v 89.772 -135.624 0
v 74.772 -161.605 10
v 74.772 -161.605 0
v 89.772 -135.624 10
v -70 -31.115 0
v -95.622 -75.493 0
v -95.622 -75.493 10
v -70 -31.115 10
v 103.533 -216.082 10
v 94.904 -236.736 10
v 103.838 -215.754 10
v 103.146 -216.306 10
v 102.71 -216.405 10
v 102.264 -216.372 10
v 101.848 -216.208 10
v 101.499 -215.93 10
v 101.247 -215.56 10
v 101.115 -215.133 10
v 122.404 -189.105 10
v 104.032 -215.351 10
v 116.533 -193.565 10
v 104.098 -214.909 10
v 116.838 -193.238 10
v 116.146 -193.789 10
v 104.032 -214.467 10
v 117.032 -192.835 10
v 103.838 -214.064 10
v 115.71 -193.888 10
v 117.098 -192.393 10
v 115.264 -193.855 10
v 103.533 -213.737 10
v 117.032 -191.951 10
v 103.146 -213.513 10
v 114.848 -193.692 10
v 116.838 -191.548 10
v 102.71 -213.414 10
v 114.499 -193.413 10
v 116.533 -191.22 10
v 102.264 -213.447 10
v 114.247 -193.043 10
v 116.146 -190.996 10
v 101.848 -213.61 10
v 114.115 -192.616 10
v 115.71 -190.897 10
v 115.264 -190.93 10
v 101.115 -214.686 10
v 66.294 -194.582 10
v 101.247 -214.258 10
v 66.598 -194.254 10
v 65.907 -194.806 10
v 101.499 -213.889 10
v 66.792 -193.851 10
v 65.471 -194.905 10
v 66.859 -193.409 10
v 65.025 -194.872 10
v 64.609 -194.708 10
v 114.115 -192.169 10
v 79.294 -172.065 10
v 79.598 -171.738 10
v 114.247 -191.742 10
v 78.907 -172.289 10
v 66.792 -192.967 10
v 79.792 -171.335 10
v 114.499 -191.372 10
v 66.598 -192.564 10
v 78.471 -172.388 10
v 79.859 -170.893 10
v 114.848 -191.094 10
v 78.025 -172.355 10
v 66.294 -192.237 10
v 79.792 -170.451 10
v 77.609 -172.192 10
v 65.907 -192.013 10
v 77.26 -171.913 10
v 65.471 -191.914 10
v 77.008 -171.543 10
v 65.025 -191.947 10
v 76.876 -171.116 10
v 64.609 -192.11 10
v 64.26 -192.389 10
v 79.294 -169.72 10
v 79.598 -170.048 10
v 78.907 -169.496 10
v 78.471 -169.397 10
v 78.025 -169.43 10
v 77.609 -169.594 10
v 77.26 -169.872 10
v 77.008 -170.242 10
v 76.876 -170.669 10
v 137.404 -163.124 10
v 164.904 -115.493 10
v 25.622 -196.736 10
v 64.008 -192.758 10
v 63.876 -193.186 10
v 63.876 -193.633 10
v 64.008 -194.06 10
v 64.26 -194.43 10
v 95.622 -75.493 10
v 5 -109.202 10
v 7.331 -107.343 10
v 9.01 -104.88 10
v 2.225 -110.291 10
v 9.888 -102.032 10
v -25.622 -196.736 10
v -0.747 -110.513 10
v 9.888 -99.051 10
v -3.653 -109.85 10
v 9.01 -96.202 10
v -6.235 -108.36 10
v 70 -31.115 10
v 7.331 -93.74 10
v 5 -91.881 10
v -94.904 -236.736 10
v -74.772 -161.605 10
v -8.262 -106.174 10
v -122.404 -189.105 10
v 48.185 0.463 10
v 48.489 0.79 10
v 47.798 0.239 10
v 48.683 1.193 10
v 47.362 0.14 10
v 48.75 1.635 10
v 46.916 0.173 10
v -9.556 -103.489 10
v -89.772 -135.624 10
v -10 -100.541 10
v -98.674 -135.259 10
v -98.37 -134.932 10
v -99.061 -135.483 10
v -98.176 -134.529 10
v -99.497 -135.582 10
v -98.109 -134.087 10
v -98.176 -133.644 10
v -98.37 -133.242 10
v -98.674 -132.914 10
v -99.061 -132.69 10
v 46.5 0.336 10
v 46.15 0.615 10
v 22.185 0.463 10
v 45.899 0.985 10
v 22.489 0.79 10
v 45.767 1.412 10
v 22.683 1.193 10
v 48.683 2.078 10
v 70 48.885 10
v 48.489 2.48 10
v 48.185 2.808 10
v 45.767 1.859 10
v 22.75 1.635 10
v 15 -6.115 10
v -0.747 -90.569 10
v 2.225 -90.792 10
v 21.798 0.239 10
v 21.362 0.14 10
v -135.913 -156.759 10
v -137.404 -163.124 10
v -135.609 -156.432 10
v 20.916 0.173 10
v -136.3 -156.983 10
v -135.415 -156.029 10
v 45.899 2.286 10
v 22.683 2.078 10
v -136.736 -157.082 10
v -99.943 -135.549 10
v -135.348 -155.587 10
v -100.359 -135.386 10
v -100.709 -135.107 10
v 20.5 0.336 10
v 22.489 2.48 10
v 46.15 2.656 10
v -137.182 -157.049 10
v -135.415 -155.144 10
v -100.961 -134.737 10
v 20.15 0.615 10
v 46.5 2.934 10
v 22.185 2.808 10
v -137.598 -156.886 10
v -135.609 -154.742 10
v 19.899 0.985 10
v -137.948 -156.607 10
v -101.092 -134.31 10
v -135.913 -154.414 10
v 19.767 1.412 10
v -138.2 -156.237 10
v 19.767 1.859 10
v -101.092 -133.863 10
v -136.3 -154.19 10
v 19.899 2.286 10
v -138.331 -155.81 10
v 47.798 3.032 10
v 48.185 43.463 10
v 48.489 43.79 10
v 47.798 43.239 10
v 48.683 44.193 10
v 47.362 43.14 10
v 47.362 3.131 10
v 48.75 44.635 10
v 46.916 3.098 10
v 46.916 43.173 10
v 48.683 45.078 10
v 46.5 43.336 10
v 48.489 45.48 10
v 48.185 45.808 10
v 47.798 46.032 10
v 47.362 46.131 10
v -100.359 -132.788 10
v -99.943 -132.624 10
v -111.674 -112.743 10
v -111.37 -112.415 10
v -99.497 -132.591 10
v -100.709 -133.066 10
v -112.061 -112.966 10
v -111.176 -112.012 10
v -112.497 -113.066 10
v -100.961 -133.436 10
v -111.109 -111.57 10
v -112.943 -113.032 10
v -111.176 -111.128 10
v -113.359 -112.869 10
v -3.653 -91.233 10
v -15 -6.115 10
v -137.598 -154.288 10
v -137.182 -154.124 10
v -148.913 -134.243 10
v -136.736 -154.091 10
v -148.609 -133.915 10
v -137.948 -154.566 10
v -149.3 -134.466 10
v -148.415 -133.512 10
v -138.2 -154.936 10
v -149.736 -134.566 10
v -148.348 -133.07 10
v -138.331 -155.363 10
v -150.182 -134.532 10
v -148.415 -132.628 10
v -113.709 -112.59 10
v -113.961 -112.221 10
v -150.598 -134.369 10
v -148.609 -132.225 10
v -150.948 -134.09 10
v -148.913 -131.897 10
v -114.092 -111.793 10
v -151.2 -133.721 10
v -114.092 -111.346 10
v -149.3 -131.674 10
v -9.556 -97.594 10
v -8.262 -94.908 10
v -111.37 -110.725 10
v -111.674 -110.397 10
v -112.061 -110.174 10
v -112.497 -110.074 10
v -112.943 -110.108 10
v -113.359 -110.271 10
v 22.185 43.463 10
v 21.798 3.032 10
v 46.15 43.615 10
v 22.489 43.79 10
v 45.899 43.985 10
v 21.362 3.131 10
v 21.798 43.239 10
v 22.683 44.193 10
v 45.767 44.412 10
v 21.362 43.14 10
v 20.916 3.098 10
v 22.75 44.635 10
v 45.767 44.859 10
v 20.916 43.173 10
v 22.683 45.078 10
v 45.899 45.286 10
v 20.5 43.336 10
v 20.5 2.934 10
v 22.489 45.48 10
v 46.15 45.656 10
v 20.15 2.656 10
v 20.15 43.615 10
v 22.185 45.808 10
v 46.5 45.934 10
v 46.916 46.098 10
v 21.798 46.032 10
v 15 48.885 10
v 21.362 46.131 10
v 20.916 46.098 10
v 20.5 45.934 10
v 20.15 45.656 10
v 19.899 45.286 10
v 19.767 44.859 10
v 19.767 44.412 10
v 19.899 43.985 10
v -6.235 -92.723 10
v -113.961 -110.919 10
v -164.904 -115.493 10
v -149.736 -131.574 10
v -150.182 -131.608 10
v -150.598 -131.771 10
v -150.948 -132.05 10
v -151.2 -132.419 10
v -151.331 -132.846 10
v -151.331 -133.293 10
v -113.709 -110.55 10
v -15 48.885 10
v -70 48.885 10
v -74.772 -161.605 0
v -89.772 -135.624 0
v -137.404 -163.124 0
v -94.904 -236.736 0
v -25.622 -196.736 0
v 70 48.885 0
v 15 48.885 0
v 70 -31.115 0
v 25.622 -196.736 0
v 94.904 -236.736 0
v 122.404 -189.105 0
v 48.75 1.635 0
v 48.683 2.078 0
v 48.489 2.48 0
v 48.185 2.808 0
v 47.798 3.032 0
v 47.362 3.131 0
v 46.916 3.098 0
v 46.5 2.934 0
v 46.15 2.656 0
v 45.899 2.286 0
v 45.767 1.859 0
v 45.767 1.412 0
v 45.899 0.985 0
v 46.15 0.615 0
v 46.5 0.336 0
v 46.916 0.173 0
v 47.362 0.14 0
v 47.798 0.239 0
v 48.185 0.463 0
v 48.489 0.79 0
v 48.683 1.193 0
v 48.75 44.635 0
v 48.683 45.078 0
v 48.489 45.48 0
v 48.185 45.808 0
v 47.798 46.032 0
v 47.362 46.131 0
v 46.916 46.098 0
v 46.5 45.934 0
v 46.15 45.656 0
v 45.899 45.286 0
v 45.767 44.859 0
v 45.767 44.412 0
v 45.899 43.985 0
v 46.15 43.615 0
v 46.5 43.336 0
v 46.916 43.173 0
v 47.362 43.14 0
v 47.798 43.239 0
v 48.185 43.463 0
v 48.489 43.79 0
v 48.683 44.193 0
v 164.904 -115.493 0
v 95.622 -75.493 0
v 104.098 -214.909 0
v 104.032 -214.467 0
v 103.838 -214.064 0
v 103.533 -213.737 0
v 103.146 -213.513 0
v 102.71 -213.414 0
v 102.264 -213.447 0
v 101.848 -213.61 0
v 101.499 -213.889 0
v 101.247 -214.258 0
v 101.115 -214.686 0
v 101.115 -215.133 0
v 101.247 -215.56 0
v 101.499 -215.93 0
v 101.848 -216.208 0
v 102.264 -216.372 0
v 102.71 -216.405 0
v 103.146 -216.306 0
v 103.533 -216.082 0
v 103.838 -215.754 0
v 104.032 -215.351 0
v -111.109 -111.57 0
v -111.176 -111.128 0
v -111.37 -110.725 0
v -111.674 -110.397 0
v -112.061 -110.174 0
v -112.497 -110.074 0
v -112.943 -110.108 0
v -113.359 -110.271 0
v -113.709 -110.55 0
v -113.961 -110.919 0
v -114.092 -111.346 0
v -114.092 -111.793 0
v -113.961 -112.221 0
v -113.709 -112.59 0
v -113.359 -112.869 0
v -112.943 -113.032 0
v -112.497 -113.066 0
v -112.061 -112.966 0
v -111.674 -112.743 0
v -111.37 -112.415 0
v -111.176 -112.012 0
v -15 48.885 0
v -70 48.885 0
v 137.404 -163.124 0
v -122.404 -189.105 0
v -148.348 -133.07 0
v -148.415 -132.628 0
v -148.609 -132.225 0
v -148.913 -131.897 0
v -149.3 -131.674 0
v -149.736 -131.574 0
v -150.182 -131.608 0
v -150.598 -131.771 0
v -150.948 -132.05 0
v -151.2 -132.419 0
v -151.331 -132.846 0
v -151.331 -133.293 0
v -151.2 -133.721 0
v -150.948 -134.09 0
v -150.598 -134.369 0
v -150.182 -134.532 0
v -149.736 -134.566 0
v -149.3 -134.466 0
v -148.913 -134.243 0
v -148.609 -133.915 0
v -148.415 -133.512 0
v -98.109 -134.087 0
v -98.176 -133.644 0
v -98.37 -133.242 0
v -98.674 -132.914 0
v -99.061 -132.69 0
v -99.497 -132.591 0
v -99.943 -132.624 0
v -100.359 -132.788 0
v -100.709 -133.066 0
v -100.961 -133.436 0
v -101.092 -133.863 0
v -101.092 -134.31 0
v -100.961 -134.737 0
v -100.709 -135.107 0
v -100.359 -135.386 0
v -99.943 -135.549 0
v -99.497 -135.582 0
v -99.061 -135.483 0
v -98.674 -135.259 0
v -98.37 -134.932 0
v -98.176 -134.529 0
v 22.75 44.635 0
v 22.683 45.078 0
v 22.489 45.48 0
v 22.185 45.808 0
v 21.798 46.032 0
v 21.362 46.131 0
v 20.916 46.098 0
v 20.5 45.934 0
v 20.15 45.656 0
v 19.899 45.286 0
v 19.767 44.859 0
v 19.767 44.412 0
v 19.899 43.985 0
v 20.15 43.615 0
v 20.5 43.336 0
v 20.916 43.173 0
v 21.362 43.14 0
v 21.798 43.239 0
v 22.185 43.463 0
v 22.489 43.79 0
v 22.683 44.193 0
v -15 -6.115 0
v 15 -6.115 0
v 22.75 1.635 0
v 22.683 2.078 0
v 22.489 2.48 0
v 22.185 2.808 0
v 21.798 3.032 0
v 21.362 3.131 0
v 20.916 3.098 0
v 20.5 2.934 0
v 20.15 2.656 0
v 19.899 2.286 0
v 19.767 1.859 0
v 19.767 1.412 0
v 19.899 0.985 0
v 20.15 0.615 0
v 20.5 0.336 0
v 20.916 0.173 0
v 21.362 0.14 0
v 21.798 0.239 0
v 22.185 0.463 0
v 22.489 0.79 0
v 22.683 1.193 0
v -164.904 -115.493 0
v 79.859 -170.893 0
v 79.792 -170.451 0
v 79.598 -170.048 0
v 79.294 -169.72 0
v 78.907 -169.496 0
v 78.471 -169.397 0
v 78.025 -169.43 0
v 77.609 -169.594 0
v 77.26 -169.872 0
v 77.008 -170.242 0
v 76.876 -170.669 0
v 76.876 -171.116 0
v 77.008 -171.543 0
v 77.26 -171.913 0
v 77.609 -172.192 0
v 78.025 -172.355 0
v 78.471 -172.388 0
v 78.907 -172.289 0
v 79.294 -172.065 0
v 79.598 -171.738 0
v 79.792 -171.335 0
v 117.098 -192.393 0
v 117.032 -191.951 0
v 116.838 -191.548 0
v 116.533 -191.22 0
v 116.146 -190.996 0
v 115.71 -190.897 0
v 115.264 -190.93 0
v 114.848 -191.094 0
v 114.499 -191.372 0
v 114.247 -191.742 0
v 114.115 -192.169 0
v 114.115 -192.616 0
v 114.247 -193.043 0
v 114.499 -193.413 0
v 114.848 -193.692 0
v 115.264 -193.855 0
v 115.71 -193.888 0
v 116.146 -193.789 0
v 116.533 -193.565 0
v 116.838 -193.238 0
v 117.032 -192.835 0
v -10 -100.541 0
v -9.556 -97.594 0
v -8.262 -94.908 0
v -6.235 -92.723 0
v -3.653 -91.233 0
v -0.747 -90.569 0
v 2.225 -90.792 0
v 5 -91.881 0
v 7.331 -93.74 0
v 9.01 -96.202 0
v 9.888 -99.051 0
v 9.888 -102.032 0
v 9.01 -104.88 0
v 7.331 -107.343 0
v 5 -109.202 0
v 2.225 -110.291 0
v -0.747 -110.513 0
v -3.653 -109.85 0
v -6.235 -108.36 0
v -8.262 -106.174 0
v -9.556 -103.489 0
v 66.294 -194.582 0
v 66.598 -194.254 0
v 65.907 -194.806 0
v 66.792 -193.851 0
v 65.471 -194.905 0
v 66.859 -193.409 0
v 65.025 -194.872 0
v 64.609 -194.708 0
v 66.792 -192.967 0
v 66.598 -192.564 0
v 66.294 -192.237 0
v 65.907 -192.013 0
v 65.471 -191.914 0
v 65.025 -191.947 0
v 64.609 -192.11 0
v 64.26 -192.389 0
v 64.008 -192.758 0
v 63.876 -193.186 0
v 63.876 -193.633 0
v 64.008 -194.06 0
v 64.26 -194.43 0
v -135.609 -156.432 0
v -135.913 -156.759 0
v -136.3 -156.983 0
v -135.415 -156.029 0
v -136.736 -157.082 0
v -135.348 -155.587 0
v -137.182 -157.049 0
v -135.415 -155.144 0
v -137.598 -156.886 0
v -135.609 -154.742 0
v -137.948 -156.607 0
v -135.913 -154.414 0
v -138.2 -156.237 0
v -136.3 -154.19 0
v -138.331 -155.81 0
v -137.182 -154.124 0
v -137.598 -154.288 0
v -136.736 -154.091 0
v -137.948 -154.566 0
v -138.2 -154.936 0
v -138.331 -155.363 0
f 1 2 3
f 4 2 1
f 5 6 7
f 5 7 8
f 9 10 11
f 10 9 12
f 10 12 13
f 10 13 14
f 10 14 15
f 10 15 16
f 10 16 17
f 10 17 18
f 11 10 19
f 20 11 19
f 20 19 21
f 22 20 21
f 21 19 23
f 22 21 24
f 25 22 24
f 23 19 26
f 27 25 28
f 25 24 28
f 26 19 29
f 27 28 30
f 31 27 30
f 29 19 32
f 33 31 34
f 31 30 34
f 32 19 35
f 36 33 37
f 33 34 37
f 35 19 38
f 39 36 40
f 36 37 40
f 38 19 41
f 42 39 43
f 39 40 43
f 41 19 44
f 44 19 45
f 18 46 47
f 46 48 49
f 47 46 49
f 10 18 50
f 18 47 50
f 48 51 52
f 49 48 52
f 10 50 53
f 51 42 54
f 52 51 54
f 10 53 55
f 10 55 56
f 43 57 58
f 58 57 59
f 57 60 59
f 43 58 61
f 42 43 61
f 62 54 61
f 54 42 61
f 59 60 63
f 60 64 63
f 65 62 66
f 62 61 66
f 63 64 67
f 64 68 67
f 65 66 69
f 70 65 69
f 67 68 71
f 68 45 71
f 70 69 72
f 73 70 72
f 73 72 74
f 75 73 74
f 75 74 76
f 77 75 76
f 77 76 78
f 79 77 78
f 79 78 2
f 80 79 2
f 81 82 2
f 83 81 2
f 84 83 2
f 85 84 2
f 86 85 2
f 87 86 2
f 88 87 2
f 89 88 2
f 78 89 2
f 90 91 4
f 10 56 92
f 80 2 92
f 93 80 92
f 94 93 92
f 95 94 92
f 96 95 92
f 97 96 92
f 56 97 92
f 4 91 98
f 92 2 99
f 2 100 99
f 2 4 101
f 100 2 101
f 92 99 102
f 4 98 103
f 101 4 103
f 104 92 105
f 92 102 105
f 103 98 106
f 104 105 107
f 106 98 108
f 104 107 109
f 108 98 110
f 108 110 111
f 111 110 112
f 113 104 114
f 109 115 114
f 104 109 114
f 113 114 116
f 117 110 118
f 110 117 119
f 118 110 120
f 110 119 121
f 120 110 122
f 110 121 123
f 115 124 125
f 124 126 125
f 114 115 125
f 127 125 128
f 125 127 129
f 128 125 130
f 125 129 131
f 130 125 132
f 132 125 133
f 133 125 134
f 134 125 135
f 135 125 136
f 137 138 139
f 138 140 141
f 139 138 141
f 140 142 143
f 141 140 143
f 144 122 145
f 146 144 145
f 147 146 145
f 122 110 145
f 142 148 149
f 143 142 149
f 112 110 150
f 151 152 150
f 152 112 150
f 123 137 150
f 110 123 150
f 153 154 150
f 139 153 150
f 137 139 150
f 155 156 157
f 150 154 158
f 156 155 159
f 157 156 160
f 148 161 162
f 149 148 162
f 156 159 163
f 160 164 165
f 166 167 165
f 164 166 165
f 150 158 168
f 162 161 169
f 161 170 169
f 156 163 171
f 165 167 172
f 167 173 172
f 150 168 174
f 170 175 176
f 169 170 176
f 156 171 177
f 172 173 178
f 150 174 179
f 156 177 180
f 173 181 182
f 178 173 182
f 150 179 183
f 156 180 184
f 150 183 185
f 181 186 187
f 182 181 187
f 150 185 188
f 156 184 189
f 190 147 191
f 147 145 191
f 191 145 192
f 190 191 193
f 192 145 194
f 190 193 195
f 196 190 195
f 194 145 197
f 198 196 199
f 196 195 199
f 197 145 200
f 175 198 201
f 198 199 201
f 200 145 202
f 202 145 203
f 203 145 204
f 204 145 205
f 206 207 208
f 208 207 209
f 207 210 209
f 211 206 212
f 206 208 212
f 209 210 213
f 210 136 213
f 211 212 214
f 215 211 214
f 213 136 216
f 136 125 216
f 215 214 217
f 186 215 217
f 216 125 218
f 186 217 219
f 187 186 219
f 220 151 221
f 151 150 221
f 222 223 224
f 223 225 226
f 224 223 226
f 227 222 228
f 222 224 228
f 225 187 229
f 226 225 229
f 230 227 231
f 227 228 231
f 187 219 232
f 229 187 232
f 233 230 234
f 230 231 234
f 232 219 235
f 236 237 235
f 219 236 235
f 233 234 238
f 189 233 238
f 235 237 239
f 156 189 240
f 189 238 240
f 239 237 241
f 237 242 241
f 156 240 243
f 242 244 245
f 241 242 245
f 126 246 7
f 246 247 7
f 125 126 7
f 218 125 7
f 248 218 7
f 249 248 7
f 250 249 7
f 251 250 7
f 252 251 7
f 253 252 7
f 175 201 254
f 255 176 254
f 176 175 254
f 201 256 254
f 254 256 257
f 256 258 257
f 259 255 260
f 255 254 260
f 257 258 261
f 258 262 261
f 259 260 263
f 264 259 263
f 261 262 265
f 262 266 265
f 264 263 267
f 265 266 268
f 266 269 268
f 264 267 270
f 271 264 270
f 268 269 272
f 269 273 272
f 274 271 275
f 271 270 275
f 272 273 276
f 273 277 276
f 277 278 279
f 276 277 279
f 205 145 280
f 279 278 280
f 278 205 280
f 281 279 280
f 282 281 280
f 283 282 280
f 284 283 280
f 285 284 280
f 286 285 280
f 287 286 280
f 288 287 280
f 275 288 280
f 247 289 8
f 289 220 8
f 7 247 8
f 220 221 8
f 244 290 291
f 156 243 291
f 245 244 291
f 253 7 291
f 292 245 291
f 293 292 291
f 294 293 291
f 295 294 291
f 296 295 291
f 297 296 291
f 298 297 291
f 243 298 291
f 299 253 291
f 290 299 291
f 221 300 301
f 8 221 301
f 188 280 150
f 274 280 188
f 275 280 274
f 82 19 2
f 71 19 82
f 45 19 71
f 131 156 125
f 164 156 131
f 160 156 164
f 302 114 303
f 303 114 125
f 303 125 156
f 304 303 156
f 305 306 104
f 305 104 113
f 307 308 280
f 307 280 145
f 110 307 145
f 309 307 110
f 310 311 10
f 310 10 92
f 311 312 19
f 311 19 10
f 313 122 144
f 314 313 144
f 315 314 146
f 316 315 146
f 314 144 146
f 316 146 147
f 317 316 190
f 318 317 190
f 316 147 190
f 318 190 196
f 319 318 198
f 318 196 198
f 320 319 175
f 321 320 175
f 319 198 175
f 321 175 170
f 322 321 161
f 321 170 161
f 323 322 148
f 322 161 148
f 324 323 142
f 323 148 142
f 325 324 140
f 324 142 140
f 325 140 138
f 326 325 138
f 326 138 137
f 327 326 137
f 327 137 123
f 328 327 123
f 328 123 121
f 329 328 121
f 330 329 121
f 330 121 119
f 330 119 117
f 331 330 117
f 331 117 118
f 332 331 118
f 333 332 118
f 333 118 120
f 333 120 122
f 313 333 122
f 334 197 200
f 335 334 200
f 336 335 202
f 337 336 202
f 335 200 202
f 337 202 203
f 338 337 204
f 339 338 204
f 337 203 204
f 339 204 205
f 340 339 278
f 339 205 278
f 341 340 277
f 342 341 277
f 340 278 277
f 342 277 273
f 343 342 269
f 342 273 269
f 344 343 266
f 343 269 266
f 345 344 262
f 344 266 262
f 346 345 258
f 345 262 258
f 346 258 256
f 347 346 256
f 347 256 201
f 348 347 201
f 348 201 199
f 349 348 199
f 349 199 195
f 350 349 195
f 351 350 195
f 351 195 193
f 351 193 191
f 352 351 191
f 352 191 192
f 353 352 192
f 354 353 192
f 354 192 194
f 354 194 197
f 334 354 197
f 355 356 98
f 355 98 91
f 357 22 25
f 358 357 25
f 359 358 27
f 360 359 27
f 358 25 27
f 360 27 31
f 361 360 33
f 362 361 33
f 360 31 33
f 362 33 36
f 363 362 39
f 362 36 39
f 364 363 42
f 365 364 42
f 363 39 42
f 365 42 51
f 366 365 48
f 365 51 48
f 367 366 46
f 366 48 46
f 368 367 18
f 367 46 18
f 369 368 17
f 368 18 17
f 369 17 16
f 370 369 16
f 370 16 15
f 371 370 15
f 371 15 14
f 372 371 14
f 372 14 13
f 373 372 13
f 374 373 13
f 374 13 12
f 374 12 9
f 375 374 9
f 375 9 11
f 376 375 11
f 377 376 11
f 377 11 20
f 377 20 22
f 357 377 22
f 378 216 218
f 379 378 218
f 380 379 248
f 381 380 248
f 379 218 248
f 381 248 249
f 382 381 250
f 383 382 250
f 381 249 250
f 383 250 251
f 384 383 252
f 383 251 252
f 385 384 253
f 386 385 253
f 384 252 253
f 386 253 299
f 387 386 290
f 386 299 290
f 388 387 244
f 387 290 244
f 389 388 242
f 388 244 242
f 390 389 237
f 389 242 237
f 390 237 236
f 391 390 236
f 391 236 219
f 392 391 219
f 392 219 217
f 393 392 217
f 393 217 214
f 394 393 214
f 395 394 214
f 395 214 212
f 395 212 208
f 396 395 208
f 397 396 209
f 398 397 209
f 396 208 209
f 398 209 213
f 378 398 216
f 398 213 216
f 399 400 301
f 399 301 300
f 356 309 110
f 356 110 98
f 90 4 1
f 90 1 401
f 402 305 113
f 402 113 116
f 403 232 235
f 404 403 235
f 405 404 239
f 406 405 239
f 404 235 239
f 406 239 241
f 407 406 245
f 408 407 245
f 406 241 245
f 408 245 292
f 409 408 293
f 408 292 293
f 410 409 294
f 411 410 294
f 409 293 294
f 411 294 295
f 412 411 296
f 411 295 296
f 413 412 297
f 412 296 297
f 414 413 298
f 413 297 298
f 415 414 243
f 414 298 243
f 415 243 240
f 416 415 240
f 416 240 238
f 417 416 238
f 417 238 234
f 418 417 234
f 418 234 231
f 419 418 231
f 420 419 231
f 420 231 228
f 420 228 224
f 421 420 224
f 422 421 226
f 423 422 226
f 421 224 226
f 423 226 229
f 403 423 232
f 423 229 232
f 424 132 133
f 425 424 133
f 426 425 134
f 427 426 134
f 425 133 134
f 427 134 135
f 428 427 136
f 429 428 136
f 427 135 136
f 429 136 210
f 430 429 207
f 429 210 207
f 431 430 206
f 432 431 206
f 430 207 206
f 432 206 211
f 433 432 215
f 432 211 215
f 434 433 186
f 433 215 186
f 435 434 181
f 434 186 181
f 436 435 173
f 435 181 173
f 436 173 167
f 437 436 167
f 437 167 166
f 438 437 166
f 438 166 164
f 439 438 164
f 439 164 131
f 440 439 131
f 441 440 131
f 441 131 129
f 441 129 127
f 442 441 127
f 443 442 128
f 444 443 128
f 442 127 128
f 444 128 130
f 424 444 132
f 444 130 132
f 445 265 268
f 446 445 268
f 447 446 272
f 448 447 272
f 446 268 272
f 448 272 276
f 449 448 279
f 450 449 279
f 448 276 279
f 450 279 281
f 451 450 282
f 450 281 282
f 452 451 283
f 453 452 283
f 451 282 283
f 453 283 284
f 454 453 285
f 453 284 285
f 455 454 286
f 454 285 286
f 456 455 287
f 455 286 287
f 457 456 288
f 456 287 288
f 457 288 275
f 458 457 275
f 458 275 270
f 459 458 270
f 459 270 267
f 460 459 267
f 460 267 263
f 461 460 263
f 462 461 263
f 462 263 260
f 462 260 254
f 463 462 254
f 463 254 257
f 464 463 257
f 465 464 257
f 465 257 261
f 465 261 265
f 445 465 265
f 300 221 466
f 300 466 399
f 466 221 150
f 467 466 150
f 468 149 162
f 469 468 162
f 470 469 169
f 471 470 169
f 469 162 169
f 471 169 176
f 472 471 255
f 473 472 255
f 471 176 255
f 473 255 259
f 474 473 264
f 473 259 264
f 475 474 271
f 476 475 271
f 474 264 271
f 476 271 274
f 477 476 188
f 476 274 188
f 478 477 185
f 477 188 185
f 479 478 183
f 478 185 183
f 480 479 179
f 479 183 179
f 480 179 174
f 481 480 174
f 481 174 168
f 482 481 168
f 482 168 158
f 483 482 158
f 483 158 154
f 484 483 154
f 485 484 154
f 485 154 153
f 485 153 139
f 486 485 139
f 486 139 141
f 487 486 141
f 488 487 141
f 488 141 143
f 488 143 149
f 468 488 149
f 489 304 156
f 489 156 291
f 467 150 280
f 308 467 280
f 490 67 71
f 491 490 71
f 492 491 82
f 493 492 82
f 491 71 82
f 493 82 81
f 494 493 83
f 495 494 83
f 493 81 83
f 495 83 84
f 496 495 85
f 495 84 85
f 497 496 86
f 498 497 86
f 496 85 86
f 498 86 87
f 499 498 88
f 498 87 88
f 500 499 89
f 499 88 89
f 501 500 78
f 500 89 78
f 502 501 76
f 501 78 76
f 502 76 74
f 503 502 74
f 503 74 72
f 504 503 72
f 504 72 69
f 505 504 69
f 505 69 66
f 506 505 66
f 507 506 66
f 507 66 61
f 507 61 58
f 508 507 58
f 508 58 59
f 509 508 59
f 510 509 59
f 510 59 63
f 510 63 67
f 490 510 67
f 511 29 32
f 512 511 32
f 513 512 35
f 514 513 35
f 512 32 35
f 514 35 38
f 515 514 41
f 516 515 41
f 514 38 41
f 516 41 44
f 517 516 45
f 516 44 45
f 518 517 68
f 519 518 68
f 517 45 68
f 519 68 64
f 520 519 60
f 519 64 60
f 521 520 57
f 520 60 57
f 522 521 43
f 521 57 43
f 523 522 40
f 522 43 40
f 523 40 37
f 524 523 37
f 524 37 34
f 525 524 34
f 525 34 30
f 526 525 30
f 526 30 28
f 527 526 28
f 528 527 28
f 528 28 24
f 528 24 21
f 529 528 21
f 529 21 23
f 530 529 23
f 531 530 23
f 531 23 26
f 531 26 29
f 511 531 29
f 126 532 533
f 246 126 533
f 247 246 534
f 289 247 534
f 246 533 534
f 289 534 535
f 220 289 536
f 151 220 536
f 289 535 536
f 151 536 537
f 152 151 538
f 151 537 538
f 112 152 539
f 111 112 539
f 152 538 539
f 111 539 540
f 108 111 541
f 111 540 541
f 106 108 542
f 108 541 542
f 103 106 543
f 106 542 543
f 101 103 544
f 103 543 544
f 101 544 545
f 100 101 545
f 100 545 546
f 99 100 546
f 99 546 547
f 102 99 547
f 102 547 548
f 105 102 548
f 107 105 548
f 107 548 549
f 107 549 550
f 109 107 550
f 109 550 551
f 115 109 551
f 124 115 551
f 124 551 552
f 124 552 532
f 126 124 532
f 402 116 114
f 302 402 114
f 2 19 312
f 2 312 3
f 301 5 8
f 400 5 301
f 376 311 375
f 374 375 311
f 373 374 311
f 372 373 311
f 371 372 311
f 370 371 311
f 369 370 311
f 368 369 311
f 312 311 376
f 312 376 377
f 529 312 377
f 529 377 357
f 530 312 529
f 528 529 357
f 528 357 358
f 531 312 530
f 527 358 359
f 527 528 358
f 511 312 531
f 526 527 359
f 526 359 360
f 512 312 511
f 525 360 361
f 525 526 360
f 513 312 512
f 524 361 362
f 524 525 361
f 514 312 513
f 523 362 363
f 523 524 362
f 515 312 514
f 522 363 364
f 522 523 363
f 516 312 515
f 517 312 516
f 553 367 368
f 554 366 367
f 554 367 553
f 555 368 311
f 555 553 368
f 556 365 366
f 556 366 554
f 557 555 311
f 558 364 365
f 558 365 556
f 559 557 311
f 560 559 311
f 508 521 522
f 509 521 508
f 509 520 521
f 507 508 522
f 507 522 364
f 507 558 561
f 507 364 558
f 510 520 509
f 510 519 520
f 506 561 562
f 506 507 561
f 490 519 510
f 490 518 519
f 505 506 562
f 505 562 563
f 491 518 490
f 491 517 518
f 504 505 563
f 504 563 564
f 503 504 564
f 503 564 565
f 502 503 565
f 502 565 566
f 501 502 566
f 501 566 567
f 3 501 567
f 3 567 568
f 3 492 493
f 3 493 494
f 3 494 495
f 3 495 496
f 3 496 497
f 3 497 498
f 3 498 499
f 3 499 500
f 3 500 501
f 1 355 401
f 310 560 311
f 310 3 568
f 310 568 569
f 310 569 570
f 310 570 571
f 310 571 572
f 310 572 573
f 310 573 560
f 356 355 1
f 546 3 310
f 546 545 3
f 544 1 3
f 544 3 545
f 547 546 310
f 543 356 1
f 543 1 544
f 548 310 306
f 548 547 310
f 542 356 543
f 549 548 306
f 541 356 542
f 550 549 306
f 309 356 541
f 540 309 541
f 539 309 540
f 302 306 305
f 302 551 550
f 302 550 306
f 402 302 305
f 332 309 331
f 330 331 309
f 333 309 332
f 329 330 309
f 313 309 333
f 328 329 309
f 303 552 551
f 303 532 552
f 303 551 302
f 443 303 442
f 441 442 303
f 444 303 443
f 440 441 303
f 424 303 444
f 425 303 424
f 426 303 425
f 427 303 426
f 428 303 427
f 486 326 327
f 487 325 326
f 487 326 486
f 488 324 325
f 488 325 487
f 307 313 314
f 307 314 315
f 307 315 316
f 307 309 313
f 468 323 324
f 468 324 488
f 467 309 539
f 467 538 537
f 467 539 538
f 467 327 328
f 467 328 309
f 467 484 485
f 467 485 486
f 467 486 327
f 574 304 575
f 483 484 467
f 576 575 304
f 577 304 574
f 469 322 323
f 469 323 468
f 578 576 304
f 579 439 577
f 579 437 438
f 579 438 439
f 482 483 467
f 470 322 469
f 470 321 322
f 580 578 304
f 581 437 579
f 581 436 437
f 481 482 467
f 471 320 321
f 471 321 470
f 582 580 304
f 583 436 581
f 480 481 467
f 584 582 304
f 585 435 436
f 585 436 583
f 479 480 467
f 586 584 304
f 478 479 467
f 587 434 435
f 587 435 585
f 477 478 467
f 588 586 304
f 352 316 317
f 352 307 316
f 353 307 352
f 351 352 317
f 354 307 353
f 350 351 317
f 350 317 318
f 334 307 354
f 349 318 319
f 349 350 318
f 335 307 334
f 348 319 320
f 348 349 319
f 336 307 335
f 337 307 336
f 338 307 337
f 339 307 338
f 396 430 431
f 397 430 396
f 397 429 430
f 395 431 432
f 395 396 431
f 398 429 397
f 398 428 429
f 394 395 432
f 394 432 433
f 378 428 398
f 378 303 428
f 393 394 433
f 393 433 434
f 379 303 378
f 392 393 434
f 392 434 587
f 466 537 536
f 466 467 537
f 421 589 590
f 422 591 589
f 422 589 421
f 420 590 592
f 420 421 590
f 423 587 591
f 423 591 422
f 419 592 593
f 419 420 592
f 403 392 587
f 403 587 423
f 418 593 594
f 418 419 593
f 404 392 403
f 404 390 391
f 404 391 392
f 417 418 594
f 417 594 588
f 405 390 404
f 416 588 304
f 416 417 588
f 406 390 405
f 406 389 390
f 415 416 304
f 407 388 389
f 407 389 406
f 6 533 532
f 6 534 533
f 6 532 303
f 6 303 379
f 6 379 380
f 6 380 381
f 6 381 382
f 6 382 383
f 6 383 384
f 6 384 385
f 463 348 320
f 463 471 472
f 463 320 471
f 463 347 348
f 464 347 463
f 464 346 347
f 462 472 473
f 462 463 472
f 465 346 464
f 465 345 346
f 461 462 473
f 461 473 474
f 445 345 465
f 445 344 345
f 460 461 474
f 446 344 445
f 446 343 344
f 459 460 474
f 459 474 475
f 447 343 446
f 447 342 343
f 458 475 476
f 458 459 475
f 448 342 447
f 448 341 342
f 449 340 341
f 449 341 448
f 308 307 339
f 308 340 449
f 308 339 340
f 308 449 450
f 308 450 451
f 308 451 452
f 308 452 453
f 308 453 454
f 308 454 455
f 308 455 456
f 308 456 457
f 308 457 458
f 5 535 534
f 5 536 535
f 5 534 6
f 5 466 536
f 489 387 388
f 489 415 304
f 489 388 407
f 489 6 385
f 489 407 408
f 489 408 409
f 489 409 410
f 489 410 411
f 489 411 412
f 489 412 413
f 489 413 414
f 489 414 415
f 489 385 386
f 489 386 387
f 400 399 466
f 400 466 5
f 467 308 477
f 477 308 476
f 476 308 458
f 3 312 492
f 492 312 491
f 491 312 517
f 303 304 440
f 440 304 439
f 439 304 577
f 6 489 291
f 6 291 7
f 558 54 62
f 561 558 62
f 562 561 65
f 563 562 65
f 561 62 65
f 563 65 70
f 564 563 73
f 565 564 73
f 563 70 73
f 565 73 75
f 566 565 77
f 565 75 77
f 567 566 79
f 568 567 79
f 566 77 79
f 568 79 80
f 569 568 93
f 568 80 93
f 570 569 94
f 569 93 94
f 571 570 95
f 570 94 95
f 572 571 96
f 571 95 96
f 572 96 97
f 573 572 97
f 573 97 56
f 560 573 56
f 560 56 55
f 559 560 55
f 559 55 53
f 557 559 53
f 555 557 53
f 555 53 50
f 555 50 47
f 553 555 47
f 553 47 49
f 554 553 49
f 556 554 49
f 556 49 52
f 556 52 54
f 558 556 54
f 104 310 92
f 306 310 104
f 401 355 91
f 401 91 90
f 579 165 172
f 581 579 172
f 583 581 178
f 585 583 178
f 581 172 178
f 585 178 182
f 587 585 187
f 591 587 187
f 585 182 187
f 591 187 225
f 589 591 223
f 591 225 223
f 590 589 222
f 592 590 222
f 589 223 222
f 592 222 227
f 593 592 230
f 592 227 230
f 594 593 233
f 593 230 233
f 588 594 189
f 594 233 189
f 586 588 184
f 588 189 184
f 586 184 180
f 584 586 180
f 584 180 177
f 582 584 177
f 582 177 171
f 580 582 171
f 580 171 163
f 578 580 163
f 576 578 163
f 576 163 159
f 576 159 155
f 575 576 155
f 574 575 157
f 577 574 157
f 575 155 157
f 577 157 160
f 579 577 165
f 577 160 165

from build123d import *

# Parameters (mm, degrees)
BOSS_EXTRU_1_DEPTH      = 10
ESQUISSE2_R             = 10
ENL_V_MAT_EXTRU_1_DEPTH = 289.682150945
ENL_V_MAT_EXTRU_2_DEPTH = 289.682150945
ENL_V_MAT_EXTRU_3_DEPTH = 289.682150945
ESQUISSE5_W             = 30
ESQUISSE5_H             = 55
ENL_V_MAT_EXTRU_4_DEPTH = 289.682150945
ESQUISSE6_R             = 1.5
ENL_V_MAT_EXTRU_5_DEPTH = 10
ESQUISSE7_R             = 1.5
ENL_V_MAT_EXTRU_6_DEPTH = 60


with BuildPart() as part:
    # Esquisse1 → Boss.-Extru.1 (new body)
    with BuildSketch(Plane.XY):
        Polygon((-70, 48.885389988), (70, 48.885389988), (70, -31.114610012), (95.621778265, -75.492831747), (164.903810568, -115.492831747), (94.903810568, -236.736388277), (25.621778265, -196.736388277), (-25.621778265, -196.736388277), (-94.903810568, -236.736388277), (-164.903810568, -115.492831747), (-95.621778265, -75.492831747), (-70, -31.114610012), align=None)
    extrude(amount=BOSS_EXTRU_1_DEPTH)

    # Esquisse2 → Enlèv. mat.-Extru.1 (cut, through all)
    with BuildSketch(Plane(origin=(0, 0, 0), x_dir=(-1, 0, 0), z_dir=(0, 0, -1))):
        with Locations((0, -100.541267528)):
            Circle(ESQUISSE2_R)
    extrude(amount=-ENL_V_MAT_EXTRU_1_DEPTH, mode=Mode.SUBTRACT)

    # Esquisse3 → Enlèv. mat.-Extru.2 (cut, through all)
    with BuildSketch(Plane.XY.offset(10)):
        Polygon((-89.77241336, -135.624228955), (-137.403810568, -163.124228955), (-122.403810568, -189.104991068), (-74.77241336, -161.604991068), align=None)
    extrude(amount=-ENL_V_MAT_EXTRU_2_DEPTH, mode=Mode.SUBTRACT)

    # Esquisse4 → Enlèv. mat.-Extru.3 (cut, through all)
    with BuildSketch(Plane.XY.offset(10)):
        Polygon((137.403810568, -163.124228955), (122.403810568, -189.104991068), (74.77241336, -161.604991068), (89.77241336, -135.624228955), align=None)
    extrude(amount=-ENL_V_MAT_EXTRU_3_DEPTH, mode=Mode.SUBTRACT)

    # Esquisse5 → Enlèv. mat.-Extru.4 (cut, through all)
    with BuildSketch(Plane.XY.offset(10)):
        with Locations((0, 21.385389988)):
            Rectangle(ESQUISSE5_W, ESQUISSE5_H)
    extrude(amount=-ENL_V_MAT_EXTRU_4_DEPTH, mode=Mode.SUBTRACT)

    # Esquisse6 → Enlèv. mat.-Extru.5 (cut)
    with BuildSketch(Plane.XY.offset(10)):
        with Locations((-136.848202602, -155.586570181)):
            Circle(ESQUISSE6_R)
        with Locations((-99.609110239, -134.086570181)):
            Circle(ESQUISSE6_R)
        with Locations((-149.848202602, -133.069909683)):
            Circle(ESQUISSE6_R)
        with Locations((-112.609110239, -111.569909683)):
            Circle(ESQUISSE6_R)
    extrude(amount=-ENL_V_MAT_EXTRU_5_DEPTH, mode=Mode.SUBTRACT)

    # Esquisse7 → Enlèv. mat.-Extru.6 (cut)
    with BuildSketch(Plane.XY.offset(10)):
        with Locations((21.25, 44.635389988)):
            Circle(ESQUISSE7_R)
        with Locations((47.25, 44.635389988)):
            Circle(ESQUISSE7_R)
        with Locations((21.25, 1.635389988)):
            Circle(ESQUISSE7_R)
        with Locations((47.25, 1.635389988)):
            Circle(ESQUISSE7_R)
        with Locations((115.598202602, -192.392649842)):
            Circle(ESQUISSE7_R)
        with Locations((78.359110239, -170.892649842)):
            Circle(ESQUISSE7_R)
        with Locations((65.359110239, -193.40931034)):
            Circle(ESQUISSE7_R)
        with Locations((102.598202602, -214.90931034)):
            Circle(ESQUISSE7_R)
    extrude(amount=-ENL_V_MAT_EXTRU_6_DEPTH, mode=Mode.SUBTRACT)


solid = part.part
